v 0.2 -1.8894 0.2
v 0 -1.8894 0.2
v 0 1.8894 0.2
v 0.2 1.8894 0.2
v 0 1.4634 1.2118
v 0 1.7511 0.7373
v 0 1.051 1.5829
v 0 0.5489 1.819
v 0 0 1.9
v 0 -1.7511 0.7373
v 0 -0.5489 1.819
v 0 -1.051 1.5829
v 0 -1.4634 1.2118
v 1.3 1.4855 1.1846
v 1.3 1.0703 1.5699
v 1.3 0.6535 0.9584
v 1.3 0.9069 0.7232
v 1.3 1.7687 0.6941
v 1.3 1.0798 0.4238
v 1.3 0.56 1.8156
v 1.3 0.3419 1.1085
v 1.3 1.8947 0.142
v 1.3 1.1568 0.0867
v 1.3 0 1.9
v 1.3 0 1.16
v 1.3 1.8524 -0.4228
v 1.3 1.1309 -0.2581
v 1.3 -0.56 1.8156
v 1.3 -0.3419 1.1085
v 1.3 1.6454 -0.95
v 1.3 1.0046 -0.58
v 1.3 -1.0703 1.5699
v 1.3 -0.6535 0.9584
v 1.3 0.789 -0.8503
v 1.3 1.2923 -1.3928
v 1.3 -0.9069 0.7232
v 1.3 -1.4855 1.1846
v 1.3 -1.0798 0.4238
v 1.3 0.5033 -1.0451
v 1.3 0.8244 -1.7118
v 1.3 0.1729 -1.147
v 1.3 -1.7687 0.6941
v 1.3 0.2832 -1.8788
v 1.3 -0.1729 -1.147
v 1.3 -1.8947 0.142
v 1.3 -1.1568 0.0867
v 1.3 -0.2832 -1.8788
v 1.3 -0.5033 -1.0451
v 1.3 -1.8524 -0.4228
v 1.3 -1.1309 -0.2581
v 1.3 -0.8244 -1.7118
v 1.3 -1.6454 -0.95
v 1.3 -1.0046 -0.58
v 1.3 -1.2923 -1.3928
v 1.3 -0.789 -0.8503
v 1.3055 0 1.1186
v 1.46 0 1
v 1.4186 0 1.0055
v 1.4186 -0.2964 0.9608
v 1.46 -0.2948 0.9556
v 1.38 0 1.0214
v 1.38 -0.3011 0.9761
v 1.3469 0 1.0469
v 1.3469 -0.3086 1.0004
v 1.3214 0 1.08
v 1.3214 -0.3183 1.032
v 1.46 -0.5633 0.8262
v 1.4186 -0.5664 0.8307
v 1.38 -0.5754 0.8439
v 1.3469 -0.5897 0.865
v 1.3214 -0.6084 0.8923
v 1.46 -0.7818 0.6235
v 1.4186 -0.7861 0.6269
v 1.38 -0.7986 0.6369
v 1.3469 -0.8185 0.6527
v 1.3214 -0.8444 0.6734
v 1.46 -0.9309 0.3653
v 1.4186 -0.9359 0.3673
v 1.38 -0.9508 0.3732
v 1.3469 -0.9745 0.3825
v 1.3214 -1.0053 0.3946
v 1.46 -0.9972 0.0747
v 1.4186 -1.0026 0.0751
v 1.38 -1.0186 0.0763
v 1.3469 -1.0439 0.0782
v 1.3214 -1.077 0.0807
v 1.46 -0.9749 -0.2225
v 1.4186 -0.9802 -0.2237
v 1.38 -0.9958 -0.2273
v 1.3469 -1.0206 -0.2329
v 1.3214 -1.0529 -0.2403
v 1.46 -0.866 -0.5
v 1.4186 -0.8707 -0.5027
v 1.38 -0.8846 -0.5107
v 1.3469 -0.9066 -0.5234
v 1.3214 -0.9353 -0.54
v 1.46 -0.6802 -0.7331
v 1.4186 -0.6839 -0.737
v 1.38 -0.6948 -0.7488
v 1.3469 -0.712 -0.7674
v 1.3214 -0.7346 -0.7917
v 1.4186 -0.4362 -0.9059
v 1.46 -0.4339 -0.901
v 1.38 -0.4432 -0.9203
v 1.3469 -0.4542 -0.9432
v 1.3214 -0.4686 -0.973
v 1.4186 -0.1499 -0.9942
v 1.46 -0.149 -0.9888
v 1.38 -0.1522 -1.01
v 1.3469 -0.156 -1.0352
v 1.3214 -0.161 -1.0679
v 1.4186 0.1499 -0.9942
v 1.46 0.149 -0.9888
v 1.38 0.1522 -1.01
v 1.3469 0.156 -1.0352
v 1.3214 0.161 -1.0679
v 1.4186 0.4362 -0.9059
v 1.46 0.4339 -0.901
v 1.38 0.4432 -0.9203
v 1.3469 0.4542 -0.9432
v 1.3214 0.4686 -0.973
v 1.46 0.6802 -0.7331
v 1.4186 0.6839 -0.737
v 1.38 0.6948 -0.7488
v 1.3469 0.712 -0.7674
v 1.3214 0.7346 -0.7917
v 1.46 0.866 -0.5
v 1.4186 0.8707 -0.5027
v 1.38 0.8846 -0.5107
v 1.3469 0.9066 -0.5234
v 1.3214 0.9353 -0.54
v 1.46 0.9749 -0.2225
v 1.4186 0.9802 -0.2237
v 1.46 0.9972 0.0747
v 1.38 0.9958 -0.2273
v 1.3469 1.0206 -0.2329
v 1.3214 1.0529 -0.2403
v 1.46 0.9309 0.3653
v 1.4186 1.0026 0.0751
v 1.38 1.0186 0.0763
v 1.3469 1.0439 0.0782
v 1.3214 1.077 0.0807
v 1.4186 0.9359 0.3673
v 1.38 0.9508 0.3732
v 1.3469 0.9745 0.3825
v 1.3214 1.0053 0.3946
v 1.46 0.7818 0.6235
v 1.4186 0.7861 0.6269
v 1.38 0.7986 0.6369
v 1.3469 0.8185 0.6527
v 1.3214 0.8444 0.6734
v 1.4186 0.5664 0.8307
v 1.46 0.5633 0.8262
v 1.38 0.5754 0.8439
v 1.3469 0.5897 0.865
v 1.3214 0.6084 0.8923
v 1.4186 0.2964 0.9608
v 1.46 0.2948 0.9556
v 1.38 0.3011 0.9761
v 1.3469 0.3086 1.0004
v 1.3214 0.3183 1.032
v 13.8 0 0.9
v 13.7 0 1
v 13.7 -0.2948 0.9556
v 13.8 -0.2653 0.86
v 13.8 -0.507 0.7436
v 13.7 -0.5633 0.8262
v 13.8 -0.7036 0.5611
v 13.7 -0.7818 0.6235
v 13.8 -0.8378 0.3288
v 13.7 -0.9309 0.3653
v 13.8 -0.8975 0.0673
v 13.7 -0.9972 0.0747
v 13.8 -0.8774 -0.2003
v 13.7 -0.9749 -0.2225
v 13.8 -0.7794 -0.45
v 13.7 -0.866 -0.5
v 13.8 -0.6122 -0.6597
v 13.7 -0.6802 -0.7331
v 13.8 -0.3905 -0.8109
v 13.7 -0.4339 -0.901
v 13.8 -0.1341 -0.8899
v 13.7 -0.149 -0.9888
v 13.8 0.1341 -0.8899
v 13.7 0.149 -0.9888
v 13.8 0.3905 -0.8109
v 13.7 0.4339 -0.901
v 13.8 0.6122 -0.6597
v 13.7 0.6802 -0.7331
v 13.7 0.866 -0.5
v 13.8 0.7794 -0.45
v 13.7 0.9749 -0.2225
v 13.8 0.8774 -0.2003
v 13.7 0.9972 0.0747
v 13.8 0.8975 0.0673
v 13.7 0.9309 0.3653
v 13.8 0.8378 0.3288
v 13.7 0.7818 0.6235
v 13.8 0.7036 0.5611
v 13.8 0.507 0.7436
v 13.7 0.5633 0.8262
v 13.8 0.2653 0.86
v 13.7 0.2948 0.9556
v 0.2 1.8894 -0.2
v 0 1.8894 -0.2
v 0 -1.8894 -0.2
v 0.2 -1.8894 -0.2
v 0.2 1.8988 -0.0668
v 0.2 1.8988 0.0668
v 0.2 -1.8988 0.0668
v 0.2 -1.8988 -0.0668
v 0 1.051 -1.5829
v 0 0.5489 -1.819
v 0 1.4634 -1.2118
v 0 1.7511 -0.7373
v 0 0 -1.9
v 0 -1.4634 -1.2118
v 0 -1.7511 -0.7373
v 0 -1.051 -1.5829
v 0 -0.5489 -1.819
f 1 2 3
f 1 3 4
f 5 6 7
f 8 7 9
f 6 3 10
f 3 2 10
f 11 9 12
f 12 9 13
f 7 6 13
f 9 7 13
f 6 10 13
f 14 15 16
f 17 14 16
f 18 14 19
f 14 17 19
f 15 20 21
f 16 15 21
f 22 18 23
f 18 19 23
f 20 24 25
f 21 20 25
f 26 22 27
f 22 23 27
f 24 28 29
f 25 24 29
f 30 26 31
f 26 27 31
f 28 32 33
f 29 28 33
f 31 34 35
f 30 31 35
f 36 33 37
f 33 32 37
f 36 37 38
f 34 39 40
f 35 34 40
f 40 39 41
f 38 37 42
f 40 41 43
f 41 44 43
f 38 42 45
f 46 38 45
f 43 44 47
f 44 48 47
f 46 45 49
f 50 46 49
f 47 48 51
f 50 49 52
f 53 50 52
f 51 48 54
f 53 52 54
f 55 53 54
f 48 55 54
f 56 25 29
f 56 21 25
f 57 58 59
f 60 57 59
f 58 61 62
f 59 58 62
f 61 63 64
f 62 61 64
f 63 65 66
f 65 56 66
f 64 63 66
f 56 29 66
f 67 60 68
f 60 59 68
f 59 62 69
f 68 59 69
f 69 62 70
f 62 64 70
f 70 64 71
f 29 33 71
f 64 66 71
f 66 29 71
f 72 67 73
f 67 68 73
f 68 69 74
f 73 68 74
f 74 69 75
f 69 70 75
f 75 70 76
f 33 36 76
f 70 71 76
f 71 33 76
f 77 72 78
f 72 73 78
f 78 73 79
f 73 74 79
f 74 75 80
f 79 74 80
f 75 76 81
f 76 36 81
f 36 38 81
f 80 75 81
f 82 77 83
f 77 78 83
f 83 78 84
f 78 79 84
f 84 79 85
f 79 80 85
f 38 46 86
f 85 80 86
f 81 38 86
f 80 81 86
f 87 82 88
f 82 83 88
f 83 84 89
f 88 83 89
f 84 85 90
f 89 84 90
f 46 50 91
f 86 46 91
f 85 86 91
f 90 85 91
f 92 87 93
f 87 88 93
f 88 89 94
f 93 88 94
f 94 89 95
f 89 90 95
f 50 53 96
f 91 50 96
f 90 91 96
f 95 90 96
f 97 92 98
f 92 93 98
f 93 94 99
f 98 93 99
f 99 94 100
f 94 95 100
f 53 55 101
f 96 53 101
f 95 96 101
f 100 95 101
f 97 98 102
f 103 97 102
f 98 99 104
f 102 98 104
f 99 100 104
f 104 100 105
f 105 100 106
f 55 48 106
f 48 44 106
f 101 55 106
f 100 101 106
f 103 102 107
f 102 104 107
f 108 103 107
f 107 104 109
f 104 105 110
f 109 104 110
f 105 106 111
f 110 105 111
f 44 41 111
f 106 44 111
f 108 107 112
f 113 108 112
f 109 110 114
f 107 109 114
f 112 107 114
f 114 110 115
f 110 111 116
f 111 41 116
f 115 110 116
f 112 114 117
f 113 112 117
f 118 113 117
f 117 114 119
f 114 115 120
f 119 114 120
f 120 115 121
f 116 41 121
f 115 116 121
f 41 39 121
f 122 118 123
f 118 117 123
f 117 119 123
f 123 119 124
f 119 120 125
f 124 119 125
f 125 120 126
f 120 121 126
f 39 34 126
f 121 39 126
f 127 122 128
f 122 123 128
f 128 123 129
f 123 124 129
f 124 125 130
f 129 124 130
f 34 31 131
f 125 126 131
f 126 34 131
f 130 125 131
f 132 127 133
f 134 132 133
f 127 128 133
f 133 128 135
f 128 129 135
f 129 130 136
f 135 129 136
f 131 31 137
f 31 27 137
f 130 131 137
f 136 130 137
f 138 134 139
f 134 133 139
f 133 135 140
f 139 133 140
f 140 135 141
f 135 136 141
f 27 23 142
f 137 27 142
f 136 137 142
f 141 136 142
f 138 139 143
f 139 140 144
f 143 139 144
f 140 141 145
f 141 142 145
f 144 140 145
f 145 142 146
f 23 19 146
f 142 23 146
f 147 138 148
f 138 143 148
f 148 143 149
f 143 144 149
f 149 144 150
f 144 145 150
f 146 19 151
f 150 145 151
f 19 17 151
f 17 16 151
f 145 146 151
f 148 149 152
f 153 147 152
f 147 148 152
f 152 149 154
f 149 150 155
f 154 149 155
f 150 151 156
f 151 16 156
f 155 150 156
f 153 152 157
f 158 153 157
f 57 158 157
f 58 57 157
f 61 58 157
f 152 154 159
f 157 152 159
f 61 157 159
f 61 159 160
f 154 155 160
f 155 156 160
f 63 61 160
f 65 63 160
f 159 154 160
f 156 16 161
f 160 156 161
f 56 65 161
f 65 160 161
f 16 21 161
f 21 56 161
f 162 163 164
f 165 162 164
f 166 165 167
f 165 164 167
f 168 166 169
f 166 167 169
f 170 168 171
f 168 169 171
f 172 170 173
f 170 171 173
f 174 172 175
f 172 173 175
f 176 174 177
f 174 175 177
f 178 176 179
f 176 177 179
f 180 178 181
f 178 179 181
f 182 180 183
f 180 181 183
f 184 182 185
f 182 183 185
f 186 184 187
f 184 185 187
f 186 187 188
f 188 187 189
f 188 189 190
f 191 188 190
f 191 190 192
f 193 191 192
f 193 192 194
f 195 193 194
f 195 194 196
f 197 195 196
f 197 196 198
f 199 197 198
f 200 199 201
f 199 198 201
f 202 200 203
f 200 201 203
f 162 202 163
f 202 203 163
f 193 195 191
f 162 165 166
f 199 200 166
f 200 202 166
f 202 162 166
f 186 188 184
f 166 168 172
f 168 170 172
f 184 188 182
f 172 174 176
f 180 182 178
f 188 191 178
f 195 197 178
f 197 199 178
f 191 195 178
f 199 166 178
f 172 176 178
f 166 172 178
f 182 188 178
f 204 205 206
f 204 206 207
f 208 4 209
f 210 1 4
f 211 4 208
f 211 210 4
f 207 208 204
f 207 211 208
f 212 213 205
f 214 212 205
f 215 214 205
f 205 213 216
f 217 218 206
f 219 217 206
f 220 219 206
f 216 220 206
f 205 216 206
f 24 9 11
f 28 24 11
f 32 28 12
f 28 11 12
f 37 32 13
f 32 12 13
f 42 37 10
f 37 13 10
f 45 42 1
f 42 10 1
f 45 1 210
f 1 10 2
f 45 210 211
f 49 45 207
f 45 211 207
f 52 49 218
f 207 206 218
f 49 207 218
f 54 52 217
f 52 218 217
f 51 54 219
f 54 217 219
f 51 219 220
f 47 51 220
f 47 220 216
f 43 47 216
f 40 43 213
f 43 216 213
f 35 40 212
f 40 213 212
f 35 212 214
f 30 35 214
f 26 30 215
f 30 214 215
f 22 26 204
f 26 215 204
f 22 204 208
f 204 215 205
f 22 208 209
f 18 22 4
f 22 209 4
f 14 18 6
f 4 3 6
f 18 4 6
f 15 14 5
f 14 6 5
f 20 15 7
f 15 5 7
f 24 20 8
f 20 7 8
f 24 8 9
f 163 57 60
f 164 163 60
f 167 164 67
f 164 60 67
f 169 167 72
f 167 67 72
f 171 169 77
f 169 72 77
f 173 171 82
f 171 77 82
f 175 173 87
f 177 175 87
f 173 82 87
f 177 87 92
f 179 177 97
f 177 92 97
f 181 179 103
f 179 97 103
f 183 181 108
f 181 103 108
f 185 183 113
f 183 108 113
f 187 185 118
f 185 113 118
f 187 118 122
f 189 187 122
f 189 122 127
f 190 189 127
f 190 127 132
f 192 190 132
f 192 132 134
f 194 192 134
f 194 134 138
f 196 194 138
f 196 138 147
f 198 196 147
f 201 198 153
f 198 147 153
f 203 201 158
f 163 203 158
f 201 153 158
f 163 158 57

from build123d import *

# Parameters (mm, degrees)
CHAMFER1_SIZE       = 0.1
FILLET1_R           = 0.16
EXTRUDE1_DEPTH      = 15.059160715
EXTRUDE1_DEPTH_BACK = 15.059160715
SKETCH2_W           = 0.2
SKETCH2_H           = 0.2


with BuildPart() as part:
    # Sketch1 → Revolve1 (revolve)
    with BuildSketch(Plane.XY, mode=Mode.PRIVATE) as revolve1_sk:
        Polygon((0, 1.9), (0, 0), (13.8, 0), (13.8, 1), (1.3, 1), (1.3, 1.9), align=None)
    revolve(revolve1_sk.sketch.rotate(Axis((0, 0, 0), (1, 0, 0)), 90), axis=Axis((0, 0, 0), (1, 0, 0)))

    # Chamfer1
    chamfer1_edges = [part.edges().sort_by_distance(p)[0] for p in [
        (13.8, 0, -1),
    ]]
    chamfer(chamfer1_edges, length=CHAMFER1_SIZE)

    # Fillet1
    fillet1_edges = [part.edges().sort_by_distance(p)[0] for p in [
        (1.3, 0, -1),
    ]]
    fillet(fillet1_edges, radius=FILLET1_R)

    # Sketch2 → Extrude1 (cut, two sides: drawn at the far end of the back side and taken through both)
    with BuildSketch(Plane(origin=(0, 0, 0), x_dir=(1, 0, 0), z_dir=(0, 1, 0)).offset(-EXTRUDE1_DEPTH_BACK)):
        with Locations((0.1, -0.1)):
            Rectangle(SKETCH2_W, SKETCH2_H)
        with Locations((0.1, 0.1)):
            Rectangle(SKETCH2_W, SKETCH2_H)
    extrude(amount=EXTRUDE1_DEPTH + EXTRUDE1_DEPTH_BACK, mode=Mode.SUBTRACT)


solid = part.part
